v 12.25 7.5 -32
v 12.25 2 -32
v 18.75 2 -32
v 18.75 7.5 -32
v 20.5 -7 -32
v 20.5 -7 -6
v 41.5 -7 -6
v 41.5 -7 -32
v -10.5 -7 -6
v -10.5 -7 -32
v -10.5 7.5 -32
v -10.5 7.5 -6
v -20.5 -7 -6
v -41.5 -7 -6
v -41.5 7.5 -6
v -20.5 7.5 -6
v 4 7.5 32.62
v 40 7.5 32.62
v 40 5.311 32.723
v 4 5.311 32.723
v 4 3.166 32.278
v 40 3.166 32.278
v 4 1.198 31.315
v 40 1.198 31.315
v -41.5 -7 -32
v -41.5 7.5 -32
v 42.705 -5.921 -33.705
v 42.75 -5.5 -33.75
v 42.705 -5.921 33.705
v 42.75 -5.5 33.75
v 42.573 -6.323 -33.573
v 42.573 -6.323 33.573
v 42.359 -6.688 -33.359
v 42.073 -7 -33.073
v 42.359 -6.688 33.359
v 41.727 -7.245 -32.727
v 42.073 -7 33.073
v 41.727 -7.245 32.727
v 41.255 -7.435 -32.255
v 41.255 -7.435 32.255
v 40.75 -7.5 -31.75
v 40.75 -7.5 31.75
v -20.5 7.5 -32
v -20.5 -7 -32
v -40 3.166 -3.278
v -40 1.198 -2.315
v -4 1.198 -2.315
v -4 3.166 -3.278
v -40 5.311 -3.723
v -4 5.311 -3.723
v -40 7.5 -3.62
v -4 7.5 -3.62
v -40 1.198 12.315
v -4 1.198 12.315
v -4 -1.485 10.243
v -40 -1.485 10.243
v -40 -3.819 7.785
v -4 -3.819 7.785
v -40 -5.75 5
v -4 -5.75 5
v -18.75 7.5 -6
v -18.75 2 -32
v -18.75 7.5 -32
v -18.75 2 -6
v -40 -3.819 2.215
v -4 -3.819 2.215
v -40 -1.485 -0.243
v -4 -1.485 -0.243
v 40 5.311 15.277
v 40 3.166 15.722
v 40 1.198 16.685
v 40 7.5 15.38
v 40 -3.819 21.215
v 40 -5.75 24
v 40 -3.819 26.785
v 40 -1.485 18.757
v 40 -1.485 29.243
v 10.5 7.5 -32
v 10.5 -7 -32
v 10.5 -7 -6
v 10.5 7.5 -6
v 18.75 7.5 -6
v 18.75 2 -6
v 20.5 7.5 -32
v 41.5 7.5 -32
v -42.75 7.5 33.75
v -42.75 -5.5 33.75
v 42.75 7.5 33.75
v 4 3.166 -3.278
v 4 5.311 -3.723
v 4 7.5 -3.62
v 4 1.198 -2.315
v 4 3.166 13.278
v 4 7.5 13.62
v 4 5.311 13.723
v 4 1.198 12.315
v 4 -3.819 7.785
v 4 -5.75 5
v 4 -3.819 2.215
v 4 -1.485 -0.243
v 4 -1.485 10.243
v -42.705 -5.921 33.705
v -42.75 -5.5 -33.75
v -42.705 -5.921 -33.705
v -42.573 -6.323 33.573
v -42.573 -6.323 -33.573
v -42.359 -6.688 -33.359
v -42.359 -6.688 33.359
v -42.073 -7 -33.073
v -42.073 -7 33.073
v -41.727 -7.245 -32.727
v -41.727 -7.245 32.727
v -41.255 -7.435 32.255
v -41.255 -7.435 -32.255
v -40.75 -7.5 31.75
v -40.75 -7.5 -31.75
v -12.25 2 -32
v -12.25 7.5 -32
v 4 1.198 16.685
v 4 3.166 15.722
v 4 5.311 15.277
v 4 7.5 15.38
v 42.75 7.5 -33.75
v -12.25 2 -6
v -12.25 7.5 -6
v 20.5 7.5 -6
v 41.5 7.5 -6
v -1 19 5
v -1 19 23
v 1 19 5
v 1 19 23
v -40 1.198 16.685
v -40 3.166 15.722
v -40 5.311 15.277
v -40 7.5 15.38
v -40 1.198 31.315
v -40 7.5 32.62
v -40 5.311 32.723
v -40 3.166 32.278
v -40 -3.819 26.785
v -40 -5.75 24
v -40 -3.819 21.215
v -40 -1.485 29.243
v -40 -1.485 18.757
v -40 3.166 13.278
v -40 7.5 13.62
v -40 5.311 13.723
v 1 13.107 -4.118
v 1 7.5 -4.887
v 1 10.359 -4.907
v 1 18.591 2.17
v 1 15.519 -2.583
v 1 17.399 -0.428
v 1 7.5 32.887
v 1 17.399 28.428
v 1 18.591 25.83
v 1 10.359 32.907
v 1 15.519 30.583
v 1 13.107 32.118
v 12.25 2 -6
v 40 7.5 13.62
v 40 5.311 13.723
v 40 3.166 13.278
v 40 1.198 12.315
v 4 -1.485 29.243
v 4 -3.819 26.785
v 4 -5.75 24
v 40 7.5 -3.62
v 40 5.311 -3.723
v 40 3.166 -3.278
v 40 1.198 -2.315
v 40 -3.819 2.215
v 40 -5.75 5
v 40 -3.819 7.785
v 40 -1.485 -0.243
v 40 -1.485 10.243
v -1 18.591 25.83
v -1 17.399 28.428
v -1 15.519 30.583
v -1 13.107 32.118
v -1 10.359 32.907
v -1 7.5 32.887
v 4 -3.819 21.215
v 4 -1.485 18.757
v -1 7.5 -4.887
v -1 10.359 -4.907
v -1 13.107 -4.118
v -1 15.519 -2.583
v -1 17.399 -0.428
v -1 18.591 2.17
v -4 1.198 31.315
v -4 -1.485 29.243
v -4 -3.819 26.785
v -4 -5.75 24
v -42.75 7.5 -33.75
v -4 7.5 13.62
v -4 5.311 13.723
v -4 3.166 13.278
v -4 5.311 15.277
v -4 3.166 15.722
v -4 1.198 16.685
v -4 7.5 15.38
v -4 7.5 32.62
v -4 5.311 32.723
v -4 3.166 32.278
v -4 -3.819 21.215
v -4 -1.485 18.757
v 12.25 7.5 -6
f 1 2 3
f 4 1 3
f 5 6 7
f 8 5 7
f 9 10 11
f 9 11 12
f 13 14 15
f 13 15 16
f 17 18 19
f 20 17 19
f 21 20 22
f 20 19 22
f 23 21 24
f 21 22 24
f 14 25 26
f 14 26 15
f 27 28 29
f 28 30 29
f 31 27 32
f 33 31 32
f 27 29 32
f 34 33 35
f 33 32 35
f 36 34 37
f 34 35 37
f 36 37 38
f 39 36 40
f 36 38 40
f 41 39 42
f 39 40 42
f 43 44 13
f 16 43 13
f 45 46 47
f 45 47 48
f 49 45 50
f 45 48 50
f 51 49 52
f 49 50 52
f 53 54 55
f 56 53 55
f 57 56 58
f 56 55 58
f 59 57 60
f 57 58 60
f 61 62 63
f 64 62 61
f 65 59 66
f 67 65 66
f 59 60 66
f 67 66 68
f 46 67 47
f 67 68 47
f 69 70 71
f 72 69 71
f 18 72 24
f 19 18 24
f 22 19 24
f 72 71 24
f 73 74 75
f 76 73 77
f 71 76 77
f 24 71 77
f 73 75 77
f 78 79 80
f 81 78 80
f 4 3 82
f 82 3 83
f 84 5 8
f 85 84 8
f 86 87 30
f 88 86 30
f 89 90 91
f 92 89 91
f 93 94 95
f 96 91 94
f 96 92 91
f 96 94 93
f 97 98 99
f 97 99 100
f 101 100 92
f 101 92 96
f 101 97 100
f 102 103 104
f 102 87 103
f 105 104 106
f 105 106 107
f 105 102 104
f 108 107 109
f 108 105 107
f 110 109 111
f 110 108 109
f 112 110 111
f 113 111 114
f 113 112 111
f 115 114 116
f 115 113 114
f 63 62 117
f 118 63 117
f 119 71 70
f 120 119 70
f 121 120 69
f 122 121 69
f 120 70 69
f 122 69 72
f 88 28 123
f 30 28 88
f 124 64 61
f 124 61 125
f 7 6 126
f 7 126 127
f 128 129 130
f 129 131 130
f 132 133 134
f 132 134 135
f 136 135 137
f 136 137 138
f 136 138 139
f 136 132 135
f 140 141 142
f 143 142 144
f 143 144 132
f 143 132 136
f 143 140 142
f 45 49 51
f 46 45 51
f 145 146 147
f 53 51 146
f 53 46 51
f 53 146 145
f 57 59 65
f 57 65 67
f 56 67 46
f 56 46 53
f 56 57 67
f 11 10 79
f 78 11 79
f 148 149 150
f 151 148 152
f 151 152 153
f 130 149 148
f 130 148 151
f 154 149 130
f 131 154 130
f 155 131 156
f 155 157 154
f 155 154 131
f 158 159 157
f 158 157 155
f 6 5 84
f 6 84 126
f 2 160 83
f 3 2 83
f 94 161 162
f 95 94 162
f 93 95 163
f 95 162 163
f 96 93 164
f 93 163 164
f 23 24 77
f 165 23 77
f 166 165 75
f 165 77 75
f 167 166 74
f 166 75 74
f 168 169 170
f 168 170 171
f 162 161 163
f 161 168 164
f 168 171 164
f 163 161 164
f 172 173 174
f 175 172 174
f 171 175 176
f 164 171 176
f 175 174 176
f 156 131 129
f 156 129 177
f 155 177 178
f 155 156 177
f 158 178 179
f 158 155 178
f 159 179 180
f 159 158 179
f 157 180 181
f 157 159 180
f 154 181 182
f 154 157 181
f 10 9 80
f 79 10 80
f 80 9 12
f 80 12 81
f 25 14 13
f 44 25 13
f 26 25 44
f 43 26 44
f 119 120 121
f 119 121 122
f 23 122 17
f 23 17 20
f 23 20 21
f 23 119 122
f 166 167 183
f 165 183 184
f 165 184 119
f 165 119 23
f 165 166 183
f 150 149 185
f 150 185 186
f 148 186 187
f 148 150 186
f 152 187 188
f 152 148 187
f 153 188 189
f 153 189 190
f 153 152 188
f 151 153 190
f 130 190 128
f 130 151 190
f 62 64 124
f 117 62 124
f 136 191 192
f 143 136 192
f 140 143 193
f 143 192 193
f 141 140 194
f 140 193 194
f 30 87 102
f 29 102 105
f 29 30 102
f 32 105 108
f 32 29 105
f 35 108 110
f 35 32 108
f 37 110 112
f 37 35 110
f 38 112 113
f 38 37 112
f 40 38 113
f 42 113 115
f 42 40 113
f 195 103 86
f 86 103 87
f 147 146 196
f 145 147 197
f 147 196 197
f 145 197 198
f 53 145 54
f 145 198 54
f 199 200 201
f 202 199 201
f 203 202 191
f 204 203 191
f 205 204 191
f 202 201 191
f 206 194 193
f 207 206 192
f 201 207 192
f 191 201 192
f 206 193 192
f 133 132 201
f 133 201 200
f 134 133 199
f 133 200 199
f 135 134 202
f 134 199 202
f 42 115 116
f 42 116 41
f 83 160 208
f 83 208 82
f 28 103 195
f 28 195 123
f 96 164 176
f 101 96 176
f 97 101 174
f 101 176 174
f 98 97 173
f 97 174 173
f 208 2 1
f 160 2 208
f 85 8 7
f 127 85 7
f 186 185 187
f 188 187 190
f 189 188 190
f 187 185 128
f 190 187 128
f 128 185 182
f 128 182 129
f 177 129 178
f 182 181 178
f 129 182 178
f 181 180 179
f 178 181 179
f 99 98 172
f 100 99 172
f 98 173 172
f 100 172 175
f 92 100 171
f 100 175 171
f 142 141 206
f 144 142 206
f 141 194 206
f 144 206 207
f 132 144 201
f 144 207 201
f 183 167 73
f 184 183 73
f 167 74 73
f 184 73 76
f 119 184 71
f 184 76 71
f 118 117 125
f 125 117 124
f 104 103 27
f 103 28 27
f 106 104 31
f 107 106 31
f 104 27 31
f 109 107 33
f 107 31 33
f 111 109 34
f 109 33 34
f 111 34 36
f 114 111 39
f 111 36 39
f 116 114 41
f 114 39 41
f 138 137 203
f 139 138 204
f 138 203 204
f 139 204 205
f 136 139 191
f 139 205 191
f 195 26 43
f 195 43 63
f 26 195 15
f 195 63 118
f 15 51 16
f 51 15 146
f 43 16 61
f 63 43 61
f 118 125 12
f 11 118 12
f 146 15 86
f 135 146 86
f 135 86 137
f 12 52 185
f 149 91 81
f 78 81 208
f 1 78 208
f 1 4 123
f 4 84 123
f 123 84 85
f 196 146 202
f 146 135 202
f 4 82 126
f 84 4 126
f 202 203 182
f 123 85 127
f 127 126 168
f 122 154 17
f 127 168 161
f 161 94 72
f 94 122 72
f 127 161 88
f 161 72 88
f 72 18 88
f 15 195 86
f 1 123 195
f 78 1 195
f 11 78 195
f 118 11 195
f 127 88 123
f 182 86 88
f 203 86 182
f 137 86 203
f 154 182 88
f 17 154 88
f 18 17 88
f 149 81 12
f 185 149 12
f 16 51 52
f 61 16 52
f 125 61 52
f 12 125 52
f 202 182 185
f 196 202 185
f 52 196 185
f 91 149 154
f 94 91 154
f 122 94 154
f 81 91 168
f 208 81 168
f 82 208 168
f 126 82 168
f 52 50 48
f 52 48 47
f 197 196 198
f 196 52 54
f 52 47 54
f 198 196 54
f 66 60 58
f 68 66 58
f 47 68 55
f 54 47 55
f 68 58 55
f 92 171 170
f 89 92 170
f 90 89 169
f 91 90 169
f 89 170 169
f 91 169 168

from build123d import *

# Parameters (mm, degrees)
SKETCH002_W                  = 85.5
SKETCH002_H                  = 67.5
PAD_DEPTH                    = 7.5
POCKET_DEPTH                 = 18
POCKET_LINEARPATTERN_2_DEPTH = 18
LINEARPATTERN001_COUNT       = 2
LINEARPATTERN001_PITCH       = 44
SKETCH003_W                  = 21
SKETCH003_H                  = 26
POCKET001_DEPTH              = 20
LINEARPATTERN002_COUNT       = 3
LINEARPATTERN002_PITCH       = 31
SKETCH004_W                  = 6.5
SKETCH004_H                  = 26
POCKET002_DEPTH              = 6
LINEARPATTERN003_COUNT       = 2
LINEARPATTERN003_PITCH       = 31
PAD001_DEPTH                 = 1
FILLET_R                     = 2


with BuildPart() as part:
    # Sketch002 → Pad (new body, symmetric)
    with BuildSketch(Plane.XZ):
        Rectangle(SKETCH002_W, SKETCH002_H)
    extrude(amount=PAD_DEPTH, both=True)

    # Sketch → Pocket (cut, symmetric)
    with BuildSketch(Plane(origin=(-22, 6, 24), x_dir=(0, 0, 1), z_dir=(1, 0, 0))):
        with BuildLine():
            ThreePointArc((-7.314507, 4.802134), (0, -8.75), (7.314507, 4.802134))
            ThreePointArc((7.314507, 4.802134), (4.058795, 8.698798), (0, 11.75))
            ThreePointArc((0, 11.75), (-4.058795, 8.698798), (-7.314507, 4.802134))
        make_face()
    pocket = extrude(amount=POCKET_DEPTH, both=True, mode=Mode.SUBTRACT)

    # Sketch LinearPattern 2 → Pocket LinearPattern 2 (cut, symmetric)
    with BuildSketch(Plane(origin=(-22, 6, 5), x_dir=(0, 0, 1), z_dir=(1, 0, 0))):
        with BuildLine():
            ThreePointArc((-7.314507, 4.802134), (0, -8.75), (7.314507, 4.802134))
            ThreePointArc((7.314507, 4.802134), (4.058795, 8.698798), (0, 11.75))
            ThreePointArc((0, 11.75), (-4.058795, 8.698798), (-7.314507, 4.802134))
        make_face()
    pocket_linearpattern_2 = extrude(amount=POCKET_LINEARPATTERN_2_DEPTH, both=True, mode=Mode.SUBTRACT)

    # LinearPattern001: Pocket, Pocket LinearPattern 2 ×2
    with Locations(*[(i * LINEARPATTERN001_PITCH, 0, 0) for i in range(1, LINEARPATTERN001_COUNT)]):
        add(pocket, mode=Mode.SUBTRACT)
        add(pocket_linearpattern_2, mode=Mode.SUBTRACT)

    # Sketch003 → Pocket001 (cut)
    with BuildSketch(Plane(origin=(-31, -7, -19), x_dir=(1, 0, 0), z_dir=(0, -1, 0))):
        Rectangle(SKETCH003_W, SKETCH003_H)
    pocket001 = extrude(amount=-POCKET001_DEPTH, mode=Mode.SUBTRACT)

    # LinearPattern002: Pocket001 ×3
    with Locations(*[(i * LINEARPATTERN002_PITCH, 0, 0) for i in range(1, LINEARPATTERN002_COUNT)]):
        add(pocket001, mode=Mode.SUBTRACT)

    # Sketch004 → Pocket002 (cut)
    with BuildSketch(Plane(origin=(15.5, 2, -19), x_dir=(1, 0, 0), z_dir=(0, -1, 0))):
        Rectangle(SKETCH004_W, SKETCH004_H)
    pocket002 = extrude(amount=-POCKET002_DEPTH, mode=Mode.SUBTRACT)

    # LinearPattern003: Pocket002 ×2
    with Locations(*[(-i * LINEARPATTERN003_PITCH, 0, 0) for i in range(1, LINEARPATTERN003_COUNT)]):
        add(pocket002, mode=Mode.SUBTRACT)

    # Sketch005 → Pad001 (join, symmetric)
    with BuildSketch(Plane.YZ):
        with BuildLine():
            ThreePointArc((19, 23), (9, 33), (-1, 23))
            Line((-1, 23), (-1, 5))
            ThreePointArc((-1, 5), (9, -5), (19, 5))
            Line((19, 23), (19, 5))
        make_face()
    extrude(amount=PAD001_DEPTH, both=True)

    # Fillet
    fillet_edges = [part.edges().sort_by_distance(p)[0] for p in [
        (0, -7.5, 33.75),
        (42.75, -7.5, 0),
        (0, -7.5, -33.75),
        (-42.75, -7.5, 0),
    ]]
    fillet(fillet_edges, radius=FILLET_R)


solid = part.part
